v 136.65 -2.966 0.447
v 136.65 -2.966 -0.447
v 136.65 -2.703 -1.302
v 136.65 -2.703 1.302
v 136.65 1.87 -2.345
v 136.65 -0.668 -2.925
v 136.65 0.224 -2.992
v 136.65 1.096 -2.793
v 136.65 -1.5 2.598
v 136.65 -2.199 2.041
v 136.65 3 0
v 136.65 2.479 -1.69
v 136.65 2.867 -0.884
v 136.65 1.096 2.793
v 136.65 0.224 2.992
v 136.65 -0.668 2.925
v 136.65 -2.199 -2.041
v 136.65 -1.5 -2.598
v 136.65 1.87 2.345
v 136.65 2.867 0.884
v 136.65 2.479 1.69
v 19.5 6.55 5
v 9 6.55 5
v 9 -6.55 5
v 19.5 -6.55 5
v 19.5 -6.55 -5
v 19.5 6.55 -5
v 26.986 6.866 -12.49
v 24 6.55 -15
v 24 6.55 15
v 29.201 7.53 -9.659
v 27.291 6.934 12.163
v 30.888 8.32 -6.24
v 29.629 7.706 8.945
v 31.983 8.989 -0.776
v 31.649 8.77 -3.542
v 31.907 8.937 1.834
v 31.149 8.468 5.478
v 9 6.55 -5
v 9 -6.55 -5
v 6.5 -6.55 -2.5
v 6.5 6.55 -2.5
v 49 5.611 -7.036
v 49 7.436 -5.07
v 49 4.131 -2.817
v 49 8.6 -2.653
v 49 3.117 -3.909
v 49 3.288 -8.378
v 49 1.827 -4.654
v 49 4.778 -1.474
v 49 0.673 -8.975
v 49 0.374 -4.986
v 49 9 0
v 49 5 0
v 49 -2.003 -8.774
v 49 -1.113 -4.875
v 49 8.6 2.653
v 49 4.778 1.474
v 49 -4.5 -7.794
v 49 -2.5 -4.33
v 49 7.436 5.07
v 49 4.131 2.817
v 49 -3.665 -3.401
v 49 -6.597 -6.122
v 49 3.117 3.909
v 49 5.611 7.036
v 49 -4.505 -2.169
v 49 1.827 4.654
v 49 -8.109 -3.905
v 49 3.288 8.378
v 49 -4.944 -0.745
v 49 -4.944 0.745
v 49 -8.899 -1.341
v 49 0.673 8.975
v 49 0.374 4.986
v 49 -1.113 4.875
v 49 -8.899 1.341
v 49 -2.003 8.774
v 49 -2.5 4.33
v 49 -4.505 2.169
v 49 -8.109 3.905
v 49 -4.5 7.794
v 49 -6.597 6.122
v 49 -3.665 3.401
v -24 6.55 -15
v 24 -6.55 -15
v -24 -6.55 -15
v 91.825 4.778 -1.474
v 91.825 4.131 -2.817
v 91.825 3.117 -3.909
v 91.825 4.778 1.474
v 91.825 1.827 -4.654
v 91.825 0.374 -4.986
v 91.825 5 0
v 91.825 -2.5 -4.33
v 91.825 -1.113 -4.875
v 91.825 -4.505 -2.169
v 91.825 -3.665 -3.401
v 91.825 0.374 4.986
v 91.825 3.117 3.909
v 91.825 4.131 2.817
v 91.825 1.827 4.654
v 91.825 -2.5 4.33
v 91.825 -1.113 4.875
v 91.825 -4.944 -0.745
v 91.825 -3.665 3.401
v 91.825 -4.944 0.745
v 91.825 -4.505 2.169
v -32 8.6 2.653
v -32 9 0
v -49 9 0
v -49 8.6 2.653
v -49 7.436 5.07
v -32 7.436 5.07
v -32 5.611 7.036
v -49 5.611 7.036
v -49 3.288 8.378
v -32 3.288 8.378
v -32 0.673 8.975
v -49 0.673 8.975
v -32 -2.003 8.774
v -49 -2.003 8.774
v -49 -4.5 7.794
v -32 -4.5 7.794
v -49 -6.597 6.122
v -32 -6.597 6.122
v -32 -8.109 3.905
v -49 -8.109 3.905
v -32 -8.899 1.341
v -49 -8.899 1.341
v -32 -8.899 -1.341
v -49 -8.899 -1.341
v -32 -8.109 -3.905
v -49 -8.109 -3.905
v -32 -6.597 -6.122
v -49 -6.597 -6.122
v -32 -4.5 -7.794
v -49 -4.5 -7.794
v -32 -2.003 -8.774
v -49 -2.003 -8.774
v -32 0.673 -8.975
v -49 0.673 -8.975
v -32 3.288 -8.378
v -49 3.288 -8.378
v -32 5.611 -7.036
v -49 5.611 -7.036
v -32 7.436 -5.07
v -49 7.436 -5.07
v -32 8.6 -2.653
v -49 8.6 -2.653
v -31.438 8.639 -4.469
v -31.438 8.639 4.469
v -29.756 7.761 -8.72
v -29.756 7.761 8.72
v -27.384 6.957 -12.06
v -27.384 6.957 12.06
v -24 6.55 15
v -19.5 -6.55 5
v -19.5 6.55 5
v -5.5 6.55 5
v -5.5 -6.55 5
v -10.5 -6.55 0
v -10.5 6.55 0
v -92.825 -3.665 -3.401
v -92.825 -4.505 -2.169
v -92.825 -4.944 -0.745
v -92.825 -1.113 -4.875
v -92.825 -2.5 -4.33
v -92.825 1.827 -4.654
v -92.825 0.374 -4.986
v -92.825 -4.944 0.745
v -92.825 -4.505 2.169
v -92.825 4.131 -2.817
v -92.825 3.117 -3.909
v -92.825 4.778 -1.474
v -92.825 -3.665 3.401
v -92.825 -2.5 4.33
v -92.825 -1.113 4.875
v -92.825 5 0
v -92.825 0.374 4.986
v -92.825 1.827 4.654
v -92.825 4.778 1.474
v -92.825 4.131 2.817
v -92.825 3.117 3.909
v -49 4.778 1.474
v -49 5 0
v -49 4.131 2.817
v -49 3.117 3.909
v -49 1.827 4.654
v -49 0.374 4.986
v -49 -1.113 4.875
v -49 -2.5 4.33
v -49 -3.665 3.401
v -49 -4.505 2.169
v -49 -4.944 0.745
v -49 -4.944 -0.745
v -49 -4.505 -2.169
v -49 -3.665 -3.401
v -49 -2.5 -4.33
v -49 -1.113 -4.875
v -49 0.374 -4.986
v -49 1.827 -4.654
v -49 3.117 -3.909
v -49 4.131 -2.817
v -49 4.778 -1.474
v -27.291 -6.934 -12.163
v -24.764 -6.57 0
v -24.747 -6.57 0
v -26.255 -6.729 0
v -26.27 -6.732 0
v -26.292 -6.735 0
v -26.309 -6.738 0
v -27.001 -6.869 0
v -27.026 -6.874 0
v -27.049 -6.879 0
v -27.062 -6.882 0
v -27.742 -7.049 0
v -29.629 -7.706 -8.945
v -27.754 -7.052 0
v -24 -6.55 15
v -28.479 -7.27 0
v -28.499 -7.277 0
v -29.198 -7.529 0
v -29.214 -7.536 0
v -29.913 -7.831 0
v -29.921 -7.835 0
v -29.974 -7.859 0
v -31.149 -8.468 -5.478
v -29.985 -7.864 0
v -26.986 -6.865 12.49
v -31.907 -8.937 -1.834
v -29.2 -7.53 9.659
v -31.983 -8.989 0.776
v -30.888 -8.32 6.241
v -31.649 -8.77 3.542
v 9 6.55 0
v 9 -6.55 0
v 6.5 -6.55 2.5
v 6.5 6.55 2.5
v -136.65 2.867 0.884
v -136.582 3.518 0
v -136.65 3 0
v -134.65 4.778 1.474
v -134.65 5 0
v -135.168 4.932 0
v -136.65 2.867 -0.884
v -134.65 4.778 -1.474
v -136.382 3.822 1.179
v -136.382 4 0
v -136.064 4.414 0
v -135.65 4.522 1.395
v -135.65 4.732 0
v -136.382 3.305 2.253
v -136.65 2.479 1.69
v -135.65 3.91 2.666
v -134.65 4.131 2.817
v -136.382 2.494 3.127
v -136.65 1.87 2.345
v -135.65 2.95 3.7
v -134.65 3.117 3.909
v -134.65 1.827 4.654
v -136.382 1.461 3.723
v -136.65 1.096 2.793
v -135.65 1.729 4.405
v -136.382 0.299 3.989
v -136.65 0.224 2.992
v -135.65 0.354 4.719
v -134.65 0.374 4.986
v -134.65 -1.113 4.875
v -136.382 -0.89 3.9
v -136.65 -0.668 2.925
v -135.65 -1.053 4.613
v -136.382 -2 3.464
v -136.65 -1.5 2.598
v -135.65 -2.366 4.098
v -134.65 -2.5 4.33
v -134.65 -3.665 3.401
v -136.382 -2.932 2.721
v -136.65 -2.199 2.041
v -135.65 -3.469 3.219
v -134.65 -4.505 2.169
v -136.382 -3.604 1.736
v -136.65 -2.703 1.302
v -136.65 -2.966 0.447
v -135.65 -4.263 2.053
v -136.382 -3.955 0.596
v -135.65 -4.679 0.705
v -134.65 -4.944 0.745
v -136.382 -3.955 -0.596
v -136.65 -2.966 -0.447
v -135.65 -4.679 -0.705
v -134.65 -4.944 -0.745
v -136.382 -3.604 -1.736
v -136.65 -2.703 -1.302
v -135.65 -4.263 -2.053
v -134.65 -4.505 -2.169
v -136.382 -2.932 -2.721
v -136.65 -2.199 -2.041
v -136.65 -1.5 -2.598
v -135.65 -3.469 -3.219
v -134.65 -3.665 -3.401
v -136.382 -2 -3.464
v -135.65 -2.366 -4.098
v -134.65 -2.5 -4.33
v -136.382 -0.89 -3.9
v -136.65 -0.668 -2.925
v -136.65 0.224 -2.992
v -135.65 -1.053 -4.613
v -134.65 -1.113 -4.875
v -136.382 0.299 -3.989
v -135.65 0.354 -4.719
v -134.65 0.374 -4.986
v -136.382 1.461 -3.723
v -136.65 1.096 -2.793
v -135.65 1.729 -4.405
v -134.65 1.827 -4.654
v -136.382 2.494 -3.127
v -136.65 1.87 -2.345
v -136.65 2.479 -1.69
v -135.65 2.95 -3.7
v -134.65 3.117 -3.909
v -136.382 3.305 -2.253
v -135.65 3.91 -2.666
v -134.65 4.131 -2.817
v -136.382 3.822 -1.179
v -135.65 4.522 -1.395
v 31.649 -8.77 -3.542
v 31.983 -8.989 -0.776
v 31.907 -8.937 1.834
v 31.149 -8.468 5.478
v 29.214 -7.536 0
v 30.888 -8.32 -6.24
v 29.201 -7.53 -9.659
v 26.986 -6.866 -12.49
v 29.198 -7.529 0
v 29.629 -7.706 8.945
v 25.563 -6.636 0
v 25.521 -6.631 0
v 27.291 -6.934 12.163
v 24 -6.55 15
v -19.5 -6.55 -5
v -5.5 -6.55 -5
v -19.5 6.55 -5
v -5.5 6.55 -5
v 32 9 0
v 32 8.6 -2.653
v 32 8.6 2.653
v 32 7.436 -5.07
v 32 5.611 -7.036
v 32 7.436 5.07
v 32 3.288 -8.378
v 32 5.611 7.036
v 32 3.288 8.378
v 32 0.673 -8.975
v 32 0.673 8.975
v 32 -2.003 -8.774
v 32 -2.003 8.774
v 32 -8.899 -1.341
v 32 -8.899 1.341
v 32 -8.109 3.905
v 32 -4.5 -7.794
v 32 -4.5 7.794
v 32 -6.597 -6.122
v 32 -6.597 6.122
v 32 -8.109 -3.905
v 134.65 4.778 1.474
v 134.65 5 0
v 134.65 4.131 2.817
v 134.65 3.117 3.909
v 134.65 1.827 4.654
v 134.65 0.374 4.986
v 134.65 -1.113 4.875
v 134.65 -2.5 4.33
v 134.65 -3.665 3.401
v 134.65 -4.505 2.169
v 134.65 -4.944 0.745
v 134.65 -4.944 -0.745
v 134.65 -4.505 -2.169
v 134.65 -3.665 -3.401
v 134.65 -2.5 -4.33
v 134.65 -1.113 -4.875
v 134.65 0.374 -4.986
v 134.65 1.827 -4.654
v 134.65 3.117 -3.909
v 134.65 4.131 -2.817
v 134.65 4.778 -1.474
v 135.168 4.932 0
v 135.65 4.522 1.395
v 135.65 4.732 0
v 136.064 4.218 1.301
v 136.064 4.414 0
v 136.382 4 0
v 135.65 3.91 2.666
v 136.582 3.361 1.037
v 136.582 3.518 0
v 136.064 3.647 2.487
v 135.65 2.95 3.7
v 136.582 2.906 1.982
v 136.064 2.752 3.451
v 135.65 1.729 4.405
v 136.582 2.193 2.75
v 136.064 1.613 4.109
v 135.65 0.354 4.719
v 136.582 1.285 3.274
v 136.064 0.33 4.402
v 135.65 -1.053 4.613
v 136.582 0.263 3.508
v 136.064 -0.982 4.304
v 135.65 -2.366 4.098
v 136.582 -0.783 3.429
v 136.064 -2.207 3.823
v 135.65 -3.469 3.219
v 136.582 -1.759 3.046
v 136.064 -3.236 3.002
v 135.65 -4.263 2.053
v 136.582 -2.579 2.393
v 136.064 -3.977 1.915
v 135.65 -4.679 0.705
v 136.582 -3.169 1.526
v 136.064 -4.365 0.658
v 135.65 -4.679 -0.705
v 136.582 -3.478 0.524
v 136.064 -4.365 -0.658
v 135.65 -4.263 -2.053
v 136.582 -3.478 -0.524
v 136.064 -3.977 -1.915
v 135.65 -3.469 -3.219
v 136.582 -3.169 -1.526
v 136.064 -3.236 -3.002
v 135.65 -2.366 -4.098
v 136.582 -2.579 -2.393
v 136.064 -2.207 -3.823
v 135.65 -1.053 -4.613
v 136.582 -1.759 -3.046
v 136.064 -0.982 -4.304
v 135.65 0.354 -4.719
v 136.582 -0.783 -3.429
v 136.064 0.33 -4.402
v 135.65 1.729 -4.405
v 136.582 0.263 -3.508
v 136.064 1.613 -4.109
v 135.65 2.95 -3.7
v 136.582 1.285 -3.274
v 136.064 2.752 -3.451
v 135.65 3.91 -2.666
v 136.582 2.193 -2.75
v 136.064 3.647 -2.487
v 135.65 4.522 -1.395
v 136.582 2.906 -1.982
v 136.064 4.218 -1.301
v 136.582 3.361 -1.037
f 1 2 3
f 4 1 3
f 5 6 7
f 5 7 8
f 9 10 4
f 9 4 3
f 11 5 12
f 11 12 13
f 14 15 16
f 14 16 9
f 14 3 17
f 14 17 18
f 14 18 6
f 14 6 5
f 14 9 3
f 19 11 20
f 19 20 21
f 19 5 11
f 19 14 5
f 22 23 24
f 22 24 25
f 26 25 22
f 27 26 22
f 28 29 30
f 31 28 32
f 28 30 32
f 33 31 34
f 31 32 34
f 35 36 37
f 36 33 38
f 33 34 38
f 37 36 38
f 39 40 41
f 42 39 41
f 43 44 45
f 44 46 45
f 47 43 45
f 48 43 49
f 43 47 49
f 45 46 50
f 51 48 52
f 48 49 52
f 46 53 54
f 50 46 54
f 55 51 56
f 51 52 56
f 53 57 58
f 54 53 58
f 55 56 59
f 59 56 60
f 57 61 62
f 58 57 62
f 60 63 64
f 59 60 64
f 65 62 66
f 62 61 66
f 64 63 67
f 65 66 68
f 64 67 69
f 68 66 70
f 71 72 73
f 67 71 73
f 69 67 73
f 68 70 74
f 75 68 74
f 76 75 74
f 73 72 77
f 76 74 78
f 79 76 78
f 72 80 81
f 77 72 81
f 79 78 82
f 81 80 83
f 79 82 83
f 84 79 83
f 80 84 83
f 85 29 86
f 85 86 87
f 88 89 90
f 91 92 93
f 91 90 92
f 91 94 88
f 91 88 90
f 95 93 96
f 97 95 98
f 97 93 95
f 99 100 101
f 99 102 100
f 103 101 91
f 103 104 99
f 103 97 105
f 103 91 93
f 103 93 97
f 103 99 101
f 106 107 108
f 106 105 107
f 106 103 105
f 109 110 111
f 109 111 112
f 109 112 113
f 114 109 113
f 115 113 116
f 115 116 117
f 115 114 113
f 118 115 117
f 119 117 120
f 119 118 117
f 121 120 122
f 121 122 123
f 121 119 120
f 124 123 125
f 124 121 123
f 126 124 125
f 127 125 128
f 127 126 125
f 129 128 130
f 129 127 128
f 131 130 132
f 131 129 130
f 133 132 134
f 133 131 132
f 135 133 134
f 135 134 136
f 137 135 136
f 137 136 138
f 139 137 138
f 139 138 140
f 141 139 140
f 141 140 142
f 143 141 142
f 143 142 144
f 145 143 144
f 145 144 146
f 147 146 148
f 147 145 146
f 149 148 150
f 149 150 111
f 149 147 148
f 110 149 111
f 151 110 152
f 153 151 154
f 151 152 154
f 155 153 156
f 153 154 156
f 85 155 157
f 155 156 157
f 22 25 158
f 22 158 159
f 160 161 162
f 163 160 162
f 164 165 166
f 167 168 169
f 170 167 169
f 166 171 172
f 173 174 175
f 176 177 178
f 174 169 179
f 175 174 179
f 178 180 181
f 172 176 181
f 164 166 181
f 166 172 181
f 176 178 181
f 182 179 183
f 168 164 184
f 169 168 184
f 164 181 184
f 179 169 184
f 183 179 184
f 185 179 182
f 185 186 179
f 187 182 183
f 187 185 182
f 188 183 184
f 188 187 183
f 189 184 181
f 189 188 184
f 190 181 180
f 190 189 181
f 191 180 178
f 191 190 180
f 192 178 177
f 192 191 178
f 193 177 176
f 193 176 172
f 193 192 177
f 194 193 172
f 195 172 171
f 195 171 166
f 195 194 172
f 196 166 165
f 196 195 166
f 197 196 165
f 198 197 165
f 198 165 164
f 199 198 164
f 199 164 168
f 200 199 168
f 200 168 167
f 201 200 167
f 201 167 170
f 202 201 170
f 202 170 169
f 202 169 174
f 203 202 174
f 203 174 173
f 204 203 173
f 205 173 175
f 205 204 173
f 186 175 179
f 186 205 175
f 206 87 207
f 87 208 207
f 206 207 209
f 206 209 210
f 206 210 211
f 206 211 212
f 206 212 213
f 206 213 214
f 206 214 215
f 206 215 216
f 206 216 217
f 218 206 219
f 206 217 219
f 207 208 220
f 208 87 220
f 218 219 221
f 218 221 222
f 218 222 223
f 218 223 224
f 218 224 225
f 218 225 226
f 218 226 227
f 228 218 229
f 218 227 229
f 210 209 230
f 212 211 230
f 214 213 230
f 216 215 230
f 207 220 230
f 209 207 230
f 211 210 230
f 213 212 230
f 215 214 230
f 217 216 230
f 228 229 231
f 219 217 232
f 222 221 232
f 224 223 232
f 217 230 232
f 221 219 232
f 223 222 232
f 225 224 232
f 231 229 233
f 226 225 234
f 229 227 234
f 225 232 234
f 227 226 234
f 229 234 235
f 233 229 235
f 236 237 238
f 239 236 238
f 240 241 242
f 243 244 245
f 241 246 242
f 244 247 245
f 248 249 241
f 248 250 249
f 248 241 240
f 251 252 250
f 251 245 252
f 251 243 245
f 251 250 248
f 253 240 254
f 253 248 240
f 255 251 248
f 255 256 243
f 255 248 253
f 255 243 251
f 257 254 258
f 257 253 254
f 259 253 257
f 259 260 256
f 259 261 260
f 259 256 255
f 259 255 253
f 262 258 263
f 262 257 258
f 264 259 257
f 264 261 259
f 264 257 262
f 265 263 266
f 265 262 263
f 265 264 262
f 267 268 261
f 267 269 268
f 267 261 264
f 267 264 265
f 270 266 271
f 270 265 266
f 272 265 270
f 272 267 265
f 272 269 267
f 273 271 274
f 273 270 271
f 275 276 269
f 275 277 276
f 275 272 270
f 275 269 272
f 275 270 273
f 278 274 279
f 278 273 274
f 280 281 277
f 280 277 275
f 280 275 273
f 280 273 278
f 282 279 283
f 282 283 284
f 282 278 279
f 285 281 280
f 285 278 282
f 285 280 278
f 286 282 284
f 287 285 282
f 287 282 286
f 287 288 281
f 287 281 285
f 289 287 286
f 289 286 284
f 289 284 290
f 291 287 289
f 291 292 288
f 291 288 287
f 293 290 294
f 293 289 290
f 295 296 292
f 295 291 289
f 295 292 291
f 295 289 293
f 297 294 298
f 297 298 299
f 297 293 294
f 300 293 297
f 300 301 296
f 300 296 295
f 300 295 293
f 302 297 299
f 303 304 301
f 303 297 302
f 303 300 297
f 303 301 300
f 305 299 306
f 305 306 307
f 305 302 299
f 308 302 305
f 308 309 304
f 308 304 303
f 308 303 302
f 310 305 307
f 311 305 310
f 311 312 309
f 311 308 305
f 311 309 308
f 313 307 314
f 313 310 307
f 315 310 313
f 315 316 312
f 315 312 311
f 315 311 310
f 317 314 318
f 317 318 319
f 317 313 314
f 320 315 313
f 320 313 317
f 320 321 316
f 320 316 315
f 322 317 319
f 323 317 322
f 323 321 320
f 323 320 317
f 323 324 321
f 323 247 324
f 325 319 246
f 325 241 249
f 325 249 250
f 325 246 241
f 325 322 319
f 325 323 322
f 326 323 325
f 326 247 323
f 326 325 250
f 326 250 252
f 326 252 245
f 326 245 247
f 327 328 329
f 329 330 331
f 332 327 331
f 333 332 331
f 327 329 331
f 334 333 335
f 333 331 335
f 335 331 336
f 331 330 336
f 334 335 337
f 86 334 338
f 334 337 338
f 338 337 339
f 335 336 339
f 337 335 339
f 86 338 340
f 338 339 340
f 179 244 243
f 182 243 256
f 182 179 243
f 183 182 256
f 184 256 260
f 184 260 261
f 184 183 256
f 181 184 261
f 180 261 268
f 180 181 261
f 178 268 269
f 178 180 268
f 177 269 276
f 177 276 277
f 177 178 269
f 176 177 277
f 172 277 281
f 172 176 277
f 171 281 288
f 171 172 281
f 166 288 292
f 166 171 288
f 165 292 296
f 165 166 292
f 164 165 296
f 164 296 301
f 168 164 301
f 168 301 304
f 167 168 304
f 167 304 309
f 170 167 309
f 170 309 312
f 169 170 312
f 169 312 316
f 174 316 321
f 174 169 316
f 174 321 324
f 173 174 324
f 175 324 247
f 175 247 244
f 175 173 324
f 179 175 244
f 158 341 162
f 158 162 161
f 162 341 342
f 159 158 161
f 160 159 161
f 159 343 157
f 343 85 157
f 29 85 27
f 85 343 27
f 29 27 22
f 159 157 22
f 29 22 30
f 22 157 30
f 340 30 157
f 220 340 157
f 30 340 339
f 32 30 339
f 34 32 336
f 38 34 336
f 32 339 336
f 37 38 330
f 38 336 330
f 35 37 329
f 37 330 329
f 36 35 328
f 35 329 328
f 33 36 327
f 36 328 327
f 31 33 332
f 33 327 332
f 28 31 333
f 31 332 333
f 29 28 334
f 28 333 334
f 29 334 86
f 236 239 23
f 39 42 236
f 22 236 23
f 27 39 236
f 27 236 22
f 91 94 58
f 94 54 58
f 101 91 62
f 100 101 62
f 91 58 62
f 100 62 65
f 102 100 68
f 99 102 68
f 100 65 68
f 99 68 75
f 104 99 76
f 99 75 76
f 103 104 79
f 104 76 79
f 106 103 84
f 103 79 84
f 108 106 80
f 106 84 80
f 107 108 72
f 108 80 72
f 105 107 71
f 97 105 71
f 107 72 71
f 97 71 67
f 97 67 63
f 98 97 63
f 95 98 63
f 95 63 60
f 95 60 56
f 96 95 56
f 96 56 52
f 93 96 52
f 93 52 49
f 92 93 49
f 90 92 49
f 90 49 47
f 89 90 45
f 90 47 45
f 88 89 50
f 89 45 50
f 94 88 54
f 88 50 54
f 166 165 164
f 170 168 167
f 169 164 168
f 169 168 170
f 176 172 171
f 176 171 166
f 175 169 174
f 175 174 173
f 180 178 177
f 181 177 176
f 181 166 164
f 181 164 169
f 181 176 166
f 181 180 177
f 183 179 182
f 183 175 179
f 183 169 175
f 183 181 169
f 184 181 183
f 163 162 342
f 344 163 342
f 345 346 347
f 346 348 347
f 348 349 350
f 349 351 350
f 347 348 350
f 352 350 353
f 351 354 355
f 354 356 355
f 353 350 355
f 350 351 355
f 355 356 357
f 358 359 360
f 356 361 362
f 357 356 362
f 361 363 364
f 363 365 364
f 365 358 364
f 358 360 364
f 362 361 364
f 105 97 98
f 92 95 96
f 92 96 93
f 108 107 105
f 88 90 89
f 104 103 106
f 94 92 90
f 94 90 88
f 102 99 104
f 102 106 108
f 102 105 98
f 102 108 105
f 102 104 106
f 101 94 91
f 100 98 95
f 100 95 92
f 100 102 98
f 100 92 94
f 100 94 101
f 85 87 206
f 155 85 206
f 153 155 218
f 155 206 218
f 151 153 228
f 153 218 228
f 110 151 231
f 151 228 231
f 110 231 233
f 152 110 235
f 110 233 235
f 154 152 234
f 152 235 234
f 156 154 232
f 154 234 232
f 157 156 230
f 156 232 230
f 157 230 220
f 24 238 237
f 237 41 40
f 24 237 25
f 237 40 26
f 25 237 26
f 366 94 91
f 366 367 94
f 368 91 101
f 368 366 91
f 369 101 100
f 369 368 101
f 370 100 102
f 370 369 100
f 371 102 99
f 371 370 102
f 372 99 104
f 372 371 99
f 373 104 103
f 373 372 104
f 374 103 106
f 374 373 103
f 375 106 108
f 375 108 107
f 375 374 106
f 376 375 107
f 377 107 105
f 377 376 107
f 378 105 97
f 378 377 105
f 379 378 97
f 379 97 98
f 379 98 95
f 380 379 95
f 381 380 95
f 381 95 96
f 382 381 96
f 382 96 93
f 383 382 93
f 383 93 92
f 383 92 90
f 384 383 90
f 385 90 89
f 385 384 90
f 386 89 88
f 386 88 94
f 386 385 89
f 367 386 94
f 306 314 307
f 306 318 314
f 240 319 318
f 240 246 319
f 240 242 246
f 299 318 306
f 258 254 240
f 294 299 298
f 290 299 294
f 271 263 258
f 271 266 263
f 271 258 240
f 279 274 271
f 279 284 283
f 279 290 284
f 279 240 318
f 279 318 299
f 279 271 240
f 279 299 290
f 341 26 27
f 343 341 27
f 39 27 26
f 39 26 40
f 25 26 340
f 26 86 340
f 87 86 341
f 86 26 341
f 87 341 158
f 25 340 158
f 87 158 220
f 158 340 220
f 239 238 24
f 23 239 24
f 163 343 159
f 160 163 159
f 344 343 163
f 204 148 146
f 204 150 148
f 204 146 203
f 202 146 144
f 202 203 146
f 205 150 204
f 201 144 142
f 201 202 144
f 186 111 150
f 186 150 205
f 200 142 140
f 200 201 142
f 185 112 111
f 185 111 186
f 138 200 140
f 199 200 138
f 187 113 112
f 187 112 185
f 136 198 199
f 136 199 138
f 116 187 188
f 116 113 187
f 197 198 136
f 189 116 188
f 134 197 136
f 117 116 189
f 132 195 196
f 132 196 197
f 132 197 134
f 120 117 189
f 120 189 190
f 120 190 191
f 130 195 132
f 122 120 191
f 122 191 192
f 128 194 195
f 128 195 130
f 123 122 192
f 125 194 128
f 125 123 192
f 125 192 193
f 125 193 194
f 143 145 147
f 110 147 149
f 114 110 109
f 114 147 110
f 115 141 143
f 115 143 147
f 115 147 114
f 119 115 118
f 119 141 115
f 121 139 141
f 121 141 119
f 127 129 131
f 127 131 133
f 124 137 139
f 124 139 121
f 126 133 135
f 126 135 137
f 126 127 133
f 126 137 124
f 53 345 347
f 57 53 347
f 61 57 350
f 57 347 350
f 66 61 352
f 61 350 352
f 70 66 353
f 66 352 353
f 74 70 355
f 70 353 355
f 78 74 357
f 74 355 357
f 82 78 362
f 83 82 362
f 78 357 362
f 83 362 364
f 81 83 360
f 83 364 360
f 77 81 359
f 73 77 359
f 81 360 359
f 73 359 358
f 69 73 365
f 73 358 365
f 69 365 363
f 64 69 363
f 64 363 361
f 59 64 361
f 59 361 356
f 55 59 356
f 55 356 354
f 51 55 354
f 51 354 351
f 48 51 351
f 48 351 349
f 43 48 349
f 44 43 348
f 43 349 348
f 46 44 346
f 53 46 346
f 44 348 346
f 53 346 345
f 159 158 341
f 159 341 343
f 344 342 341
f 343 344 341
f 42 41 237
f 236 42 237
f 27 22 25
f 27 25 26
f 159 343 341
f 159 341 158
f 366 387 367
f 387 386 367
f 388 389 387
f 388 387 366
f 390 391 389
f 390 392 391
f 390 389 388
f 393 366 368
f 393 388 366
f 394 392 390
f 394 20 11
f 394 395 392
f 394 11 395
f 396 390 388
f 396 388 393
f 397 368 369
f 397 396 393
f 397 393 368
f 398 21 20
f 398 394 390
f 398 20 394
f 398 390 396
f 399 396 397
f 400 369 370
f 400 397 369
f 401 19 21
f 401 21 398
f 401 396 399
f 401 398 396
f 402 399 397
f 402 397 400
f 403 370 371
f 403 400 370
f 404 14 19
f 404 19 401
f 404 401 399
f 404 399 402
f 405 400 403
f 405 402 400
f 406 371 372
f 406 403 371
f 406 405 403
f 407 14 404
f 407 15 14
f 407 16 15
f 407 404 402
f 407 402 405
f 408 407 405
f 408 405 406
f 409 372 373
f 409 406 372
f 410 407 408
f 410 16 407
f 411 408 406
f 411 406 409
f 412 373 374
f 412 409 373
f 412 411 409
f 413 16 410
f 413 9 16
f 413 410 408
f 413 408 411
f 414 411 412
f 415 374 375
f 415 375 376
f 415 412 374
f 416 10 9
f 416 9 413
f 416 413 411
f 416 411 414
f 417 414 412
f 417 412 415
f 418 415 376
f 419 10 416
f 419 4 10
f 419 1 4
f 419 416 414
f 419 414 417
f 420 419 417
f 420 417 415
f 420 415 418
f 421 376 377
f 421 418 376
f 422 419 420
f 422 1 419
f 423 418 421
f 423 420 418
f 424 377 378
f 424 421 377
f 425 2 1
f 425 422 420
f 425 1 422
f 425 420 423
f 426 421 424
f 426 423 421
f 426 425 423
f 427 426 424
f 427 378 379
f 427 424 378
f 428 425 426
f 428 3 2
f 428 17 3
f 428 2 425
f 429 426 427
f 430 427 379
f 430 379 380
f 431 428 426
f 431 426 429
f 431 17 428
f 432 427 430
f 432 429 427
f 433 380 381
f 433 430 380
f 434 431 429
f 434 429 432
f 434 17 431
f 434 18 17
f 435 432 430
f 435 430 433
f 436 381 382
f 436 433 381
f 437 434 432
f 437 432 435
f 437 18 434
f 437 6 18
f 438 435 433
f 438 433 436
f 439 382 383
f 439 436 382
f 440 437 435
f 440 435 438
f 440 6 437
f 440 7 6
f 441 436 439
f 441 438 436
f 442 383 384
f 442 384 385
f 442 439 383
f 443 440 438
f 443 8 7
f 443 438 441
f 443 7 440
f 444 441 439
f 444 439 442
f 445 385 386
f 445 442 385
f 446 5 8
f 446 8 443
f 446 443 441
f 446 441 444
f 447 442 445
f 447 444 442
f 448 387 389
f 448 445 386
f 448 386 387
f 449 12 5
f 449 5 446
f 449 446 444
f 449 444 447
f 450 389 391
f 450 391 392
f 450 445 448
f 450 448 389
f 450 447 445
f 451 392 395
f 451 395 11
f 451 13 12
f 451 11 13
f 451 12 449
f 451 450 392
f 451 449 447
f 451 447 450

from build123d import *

# Parameters (mm, degrees)
FILLET1_R               = 2
BOSS_EXTRUDE1_DEPTH     = 15
CUT_EXTRUDE2_DEPTH      = 139.347479196
CUT_EXTRUDE2_DEPTH_BACK = 139.347479196
SPLIT1_START            = -6.55
SPLIT1_DEPTH            = 13.1
SPLIT1_START_2          = -19.5
SPLIT1_2_OUTLINE_W      = 13.1
SPLIT1_2_OUTLINE_H      = 10
SPLIT1_2_DEPTH          = 39
SPLIT1_3_DEPTH          = 13.1
SPLIT2_START            = -136.65
SPLIT2_2_OUTLINE_R      = 5
SPLIT2_2_DEPTH          = 43.825
SPLIT2_START_2          = 91.825
SPLIT2_3_OUTLINE_R      = 5
SPLIT2_3_DEPTH          = 44.825


# Read off the part's stored shape, not the designer's step: Revolve9, Split1, Split2
with BuildPart() as part:
    # Revolve9 outline → Revolve9 (revolve)
    with BuildSketch(Plane.YX):
        with BuildLine():
            Line((9, -49), (9, -32))
            ThreePointArc((9, -32), (7.176225033, -28.183374834), (6.55, -24))
            Line((6.55, -24), (6.55, 0))
            Line((6.55, 0), (0, 0))
            Line((0, 0), (0, -136.65))
            Line((0, -136.65), (5, -136.65))
            Line((5, -136.65), (5, -49))
            Line((5, -49), (9, -49))
        make_face()
    revolve(axis=Axis((0, 0, 0), (1, 0, 0)))

    # Fillet1
    fillet1_edges = [part.edges().sort_by_distance(p)[0] for p in [
        (-136.65, -5, 0),
    ]]
    fillet(fillet1_edges, radius=FILLET1_R)

    # Mirror1: part across plane


with BuildPart() as part_1:
    add(part.part)
    add(part.part.mirror(Plane(origin=(0, 0, 0), x_dir=(0, 0, 1), z_dir=(1, 0, 0))))

    # Sketch5 → Boss-Extrude1 (add, symmetric)
    with BuildSketch(Plane.XY):
        with BuildLine():
            Line((-24, 6.55), (24, 6.55))
            ThreePointArc((24, 6.55), (28.183374834, 7.176225033), (32, 9))
            Line((32, 9), (32, -9))
            ThreePointArc((32, -9), (28.183374834, -7.176225033), (24, -6.55))
            Line((24, -6.55), (-24, -6.55))
            ThreePointArc((-24, -6.55), (-28.183374834, -7.176225033), (-32, -9))
            Line((-32, -9), (-32, 9))
            ThreePointArc((-32, 9), (-28.183374834, 7.176225033), (-24, 6.55))
        make_face()
    extrude(amount=BOSS_EXTRUDE1_DEPTH, both=True)

    # Sketch6 → Cut-Extrude2 (cut, two sides: drawn at the far end of the back side and taken through both)
    with BuildSketch(Plane(origin=(0, 6.55, 0), x_dir=(1, 0, 0), z_dir=(0, 1, 0)).offset(-CUT_EXTRUDE2_DEPTH_BACK)):
        with BuildLine():
            Line((-32, 15), (-32, 0))
            ThreePointArc((-32, 0), (-29.875, 8.5), (-24, 15))
            Line((-24, 15), (-32, 15))
        make_face()
        with BuildLine():
            ThreePointArc((-32, 0), (-29.875, -8.5), (-24, -15))
            Line((-24, -15), (-32, -15))
            Line((-32, -15), (-32, 0))
        make_face()
        with BuildLine():
            ThreePointArc((24, -15), (29.875, -8.5), (32, 0))
            Line((32, 0), (32, -15))
            Line((32, -15), (24, -15))
        make_face()
        with BuildLine():
            ThreePointArc((32, 0), (29.875, 8.5), (24, 15))
            Line((24, 15), (32, 15))
            Line((32, 15), (32, 0))
        make_face()
        Polygon((9, 5), (-5.5, 5), (-10.5, 0), (-5.5, -5), (9, -5), (6.5, -2.5), (9, 0), (6.5, 2.5), align=None)
    extrude(amount=CUT_EXTRUDE2_DEPTH + CUT_EXTRUDE2_DEPTH_BACK, mode=Mode.SUBTRACT)


with BuildPart() as cut_extrude2_piece_1:
    # of the separate pieces the step leaves, piece 1, a body of its own (cut_extrude2_pieces)
    add(part_1.part.solids().sort_by_distance((-24, -6.55, -15))[0])

    # Split1 2 outline → Split1 2 (cut)
    with BuildSketch(Plane.YZ.offset(SPLIT1_START_2)):
        Rectangle(SPLIT1_2_OUTLINE_W, SPLIT1_2_OUTLINE_H)
    extrude(amount=SPLIT1_2_DEPTH, mode=Mode.SUBTRACT)


with BuildPart() as cut_extrude2_piece_2:
    # of the separate pieces the step leaves, piece 2, a body of its own (cut_extrude2_pieces)
    add(part_1.part.solids().sort_by_distance((-136.65, 3, 0))[0])

    # Split2 2 outline → Split2 2 (cut)
    with BuildSketch(Plane.YZ.offset(SPLIT2_START)):
        Circle(SPLIT2_2_OUTLINE_R)
    extrude(amount=SPLIT2_2_DEPTH, mode=Mode.SUBTRACT)


with BuildPart() as cut_extrude2_piece_3:
    # of the separate pieces the step leaves, piece 3, a body of its own (cut_extrude2_pieces)
    add(part_1.part.solids().sort_by_distance((49, 9, 0))[0])

    # Split2 3 outline → Split2 3 (cut)
    with BuildSketch(Plane.YZ.offset(SPLIT2_START_2)):
        Circle(SPLIT2_3_OUTLINE_R)
    extrude(amount=SPLIT2_3_DEPTH, mode=Mode.SUBTRACT)


with BuildPart() as body_4:
    # Split1 outline → Split1 (new body)
    with BuildSketch(Plane(origin=(0, 0, 0), x_dir=(1, 0, 0), z_dir=(0, 1, 0)).offset(SPLIT1_START)):
        Polygon((19.5, 5), (9, 5), (6.5, 2.5), (9, 0), (6.5, -2.5), (9, -5), (19.5, -5), align=None)
    extrude(amount=SPLIT1_DEPTH)


with BuildPart() as body_5:
    # Split1 3 outline → Split1 3 (new body)
    with BuildSketch(Plane(origin=(0, 0, 0), x_dir=(1, 0, 0), z_dir=(0, 1, 0)).offset(SPLIT1_START)):
        Polygon((-19.5, 5), (-19.5, -5), (-5.5, -5), (-10.5, 0), (-5.5, 5), align=None)
    extrude(amount=SPLIT1_3_DEPTH)


with BuildPart() as body_6:
    # Split2 outline → Split2 (revolve)
    with BuildSketch(Plane.YX):
        with BuildLine():
            Line((0, 136.65), (0, 91.825))
            Line((0, 91.825), (5, 91.825))
            Line((5, 91.825), (5, 134.65))
            ThreePointArc((5, 134.65), (4.414213562, 136.064213562), (3, 136.65))
            Line((3, 136.65), (0, 136.65))
        make_face()
    revolve(axis=Axis((0, 0, 0), (1, 0, 0)))


with BuildPart() as body_7:
    # Split2 4 outline → Split2 4 (revolve)
    with BuildSketch(Plane.YX):
        with BuildLine():
            Line((5, -92.825), (0, -92.825))
            Line((0, -92.825), (0, -136.65))
            Line((0, -136.65), (3, -136.65))
            ThreePointArc((3, -136.65), (4.414213562, -136.064213562), (5, -134.65))
            Line((5, -134.65), (5, -92.825))
        make_face()
    revolve(axis=Axis((0, 0, 0), (1, 0, 0)))


solid = Compound([cut_extrude2_piece_1.part, cut_extrude2_piece_2.part, cut_extrude2_piece_3.part, body_4.part, body_5.part, body_6.part, body_7.part])
